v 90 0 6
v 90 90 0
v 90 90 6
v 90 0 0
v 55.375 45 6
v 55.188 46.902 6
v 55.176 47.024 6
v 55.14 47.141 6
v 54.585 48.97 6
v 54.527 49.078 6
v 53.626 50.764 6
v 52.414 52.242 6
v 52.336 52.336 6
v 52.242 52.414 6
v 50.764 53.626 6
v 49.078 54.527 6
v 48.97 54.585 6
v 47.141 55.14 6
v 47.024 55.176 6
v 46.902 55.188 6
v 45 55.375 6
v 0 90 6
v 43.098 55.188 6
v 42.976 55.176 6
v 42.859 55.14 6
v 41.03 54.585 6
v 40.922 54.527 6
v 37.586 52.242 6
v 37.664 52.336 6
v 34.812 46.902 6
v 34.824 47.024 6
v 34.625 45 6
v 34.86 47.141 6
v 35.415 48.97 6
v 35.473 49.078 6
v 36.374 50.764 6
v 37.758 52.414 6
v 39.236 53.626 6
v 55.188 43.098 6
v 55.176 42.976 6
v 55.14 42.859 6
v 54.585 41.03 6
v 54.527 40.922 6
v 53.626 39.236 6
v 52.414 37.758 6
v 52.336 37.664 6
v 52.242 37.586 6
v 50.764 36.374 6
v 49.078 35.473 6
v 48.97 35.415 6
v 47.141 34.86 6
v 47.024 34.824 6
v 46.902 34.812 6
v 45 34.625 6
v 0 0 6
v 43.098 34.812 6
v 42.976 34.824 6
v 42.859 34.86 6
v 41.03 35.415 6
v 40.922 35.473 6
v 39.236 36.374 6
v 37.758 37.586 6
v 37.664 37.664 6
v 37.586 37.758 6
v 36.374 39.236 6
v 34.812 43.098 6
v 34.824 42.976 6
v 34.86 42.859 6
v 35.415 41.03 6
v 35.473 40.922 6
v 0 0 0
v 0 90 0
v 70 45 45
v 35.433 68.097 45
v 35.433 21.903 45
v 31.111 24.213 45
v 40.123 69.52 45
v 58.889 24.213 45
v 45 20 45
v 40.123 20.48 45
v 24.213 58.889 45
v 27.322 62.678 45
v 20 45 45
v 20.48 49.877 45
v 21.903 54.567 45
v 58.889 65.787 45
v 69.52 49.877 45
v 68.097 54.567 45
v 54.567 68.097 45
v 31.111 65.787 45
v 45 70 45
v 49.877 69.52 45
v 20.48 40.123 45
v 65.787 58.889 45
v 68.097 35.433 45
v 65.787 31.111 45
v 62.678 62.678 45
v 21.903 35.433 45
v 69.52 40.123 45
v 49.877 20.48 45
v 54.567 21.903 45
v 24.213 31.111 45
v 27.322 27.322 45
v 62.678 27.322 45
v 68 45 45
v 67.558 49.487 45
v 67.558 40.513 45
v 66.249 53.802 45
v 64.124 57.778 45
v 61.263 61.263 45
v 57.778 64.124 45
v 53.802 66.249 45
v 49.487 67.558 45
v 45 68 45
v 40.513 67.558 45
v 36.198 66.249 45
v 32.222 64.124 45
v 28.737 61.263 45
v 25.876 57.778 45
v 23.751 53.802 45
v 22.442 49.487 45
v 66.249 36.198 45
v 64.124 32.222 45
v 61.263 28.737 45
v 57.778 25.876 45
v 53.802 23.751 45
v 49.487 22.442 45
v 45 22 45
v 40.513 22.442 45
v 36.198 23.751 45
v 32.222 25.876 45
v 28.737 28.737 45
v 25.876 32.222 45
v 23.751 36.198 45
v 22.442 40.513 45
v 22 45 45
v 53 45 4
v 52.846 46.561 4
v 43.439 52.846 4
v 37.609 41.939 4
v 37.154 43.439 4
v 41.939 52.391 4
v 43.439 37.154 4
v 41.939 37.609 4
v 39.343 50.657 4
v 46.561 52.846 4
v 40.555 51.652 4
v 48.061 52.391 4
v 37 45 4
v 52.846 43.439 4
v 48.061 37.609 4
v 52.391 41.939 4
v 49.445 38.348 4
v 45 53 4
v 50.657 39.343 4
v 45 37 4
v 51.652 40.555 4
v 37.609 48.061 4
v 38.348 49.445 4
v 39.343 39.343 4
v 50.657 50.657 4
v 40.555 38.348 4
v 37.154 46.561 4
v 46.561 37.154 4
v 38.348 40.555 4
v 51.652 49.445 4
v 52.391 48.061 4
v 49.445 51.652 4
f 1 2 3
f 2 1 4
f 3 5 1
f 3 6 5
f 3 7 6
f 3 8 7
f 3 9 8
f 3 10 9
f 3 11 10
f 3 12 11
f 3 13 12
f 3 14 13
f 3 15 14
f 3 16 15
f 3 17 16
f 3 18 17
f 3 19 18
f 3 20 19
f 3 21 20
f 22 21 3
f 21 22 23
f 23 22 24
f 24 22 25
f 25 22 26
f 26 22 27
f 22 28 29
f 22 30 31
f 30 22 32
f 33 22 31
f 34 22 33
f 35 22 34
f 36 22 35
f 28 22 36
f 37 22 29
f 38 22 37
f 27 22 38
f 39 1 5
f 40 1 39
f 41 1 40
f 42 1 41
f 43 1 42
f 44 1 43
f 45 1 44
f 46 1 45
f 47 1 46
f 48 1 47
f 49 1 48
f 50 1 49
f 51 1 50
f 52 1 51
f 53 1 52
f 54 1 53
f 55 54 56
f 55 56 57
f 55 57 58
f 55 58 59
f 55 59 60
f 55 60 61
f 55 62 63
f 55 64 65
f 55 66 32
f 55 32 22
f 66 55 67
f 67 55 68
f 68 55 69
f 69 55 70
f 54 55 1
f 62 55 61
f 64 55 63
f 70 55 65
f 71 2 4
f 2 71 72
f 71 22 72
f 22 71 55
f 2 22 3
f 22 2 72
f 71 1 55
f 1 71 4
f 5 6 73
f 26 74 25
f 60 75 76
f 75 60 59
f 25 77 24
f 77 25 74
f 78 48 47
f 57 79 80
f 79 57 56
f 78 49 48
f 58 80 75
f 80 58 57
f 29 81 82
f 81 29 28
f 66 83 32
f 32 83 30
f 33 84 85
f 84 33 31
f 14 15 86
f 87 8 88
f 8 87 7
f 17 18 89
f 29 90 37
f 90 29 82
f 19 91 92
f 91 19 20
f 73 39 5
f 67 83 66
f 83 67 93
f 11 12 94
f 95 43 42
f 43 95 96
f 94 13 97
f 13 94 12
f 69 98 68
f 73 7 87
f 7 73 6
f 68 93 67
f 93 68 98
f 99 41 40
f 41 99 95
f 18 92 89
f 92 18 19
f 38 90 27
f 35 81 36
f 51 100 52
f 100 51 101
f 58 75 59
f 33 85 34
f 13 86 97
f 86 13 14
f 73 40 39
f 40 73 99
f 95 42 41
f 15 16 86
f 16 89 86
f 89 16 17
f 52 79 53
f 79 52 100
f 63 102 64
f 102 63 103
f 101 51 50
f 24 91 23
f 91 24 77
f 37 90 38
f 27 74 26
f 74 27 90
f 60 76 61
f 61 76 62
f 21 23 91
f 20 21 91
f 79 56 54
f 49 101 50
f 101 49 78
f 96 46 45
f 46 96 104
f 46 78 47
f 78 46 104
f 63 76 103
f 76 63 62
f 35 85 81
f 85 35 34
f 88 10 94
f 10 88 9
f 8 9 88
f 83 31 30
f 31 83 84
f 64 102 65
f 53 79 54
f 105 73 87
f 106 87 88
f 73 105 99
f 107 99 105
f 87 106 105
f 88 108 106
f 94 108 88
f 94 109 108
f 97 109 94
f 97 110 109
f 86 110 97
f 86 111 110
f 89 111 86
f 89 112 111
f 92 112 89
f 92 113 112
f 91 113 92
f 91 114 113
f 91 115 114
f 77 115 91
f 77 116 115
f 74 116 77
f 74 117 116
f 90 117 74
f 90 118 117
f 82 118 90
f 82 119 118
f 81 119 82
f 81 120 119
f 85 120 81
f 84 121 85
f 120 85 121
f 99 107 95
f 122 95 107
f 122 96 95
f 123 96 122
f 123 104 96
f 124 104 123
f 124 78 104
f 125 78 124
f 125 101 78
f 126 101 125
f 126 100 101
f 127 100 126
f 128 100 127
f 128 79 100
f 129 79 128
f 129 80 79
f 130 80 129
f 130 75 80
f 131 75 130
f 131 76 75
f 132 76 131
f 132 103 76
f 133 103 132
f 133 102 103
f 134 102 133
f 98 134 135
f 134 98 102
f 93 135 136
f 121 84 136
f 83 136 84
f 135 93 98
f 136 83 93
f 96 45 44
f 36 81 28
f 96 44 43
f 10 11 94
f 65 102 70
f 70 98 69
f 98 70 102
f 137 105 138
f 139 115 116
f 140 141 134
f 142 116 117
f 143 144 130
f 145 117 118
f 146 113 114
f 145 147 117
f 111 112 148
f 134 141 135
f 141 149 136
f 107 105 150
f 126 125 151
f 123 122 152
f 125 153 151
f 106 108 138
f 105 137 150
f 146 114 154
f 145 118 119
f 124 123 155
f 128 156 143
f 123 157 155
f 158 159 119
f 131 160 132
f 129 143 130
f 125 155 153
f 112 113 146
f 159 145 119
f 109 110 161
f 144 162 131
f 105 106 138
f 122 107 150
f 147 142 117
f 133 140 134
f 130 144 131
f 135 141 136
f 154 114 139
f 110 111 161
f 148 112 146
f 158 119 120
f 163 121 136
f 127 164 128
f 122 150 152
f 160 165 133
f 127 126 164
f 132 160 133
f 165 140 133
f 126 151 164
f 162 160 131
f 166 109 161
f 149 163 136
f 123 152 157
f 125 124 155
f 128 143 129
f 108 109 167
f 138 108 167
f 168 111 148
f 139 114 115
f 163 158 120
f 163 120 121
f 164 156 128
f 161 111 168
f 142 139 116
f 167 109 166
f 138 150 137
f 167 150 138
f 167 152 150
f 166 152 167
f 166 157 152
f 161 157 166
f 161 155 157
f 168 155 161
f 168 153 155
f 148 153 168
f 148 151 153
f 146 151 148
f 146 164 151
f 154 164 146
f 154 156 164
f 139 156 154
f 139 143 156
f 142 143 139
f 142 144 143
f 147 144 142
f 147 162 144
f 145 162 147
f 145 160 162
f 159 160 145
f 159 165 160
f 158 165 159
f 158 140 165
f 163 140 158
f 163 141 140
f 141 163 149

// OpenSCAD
$fn = 32;

// ----------------------------------------------------------------------
// Hopper: funnel with square flange
// ----------------------------------------------------------------------

// --- parameters (mm) ---
fl = 90;                  // flange side, X and Y
fl_t = 6;                 // flange thickness
cone_h = 40;              // cone height above the flange
top_d = 50;               // cone mouth diameter
bot_d = 20;               // cone spout diameter
wall = 2;                 // cone wall thickness
fit_tol = 0.02;           // tolerance for press fits, mm
free_tol = 0.2;           // tolerance for clearance fits, mm

bore_d = bot_d - 2 * wall;  // spout bore diameter
total_h = fl_t + cone_h - 1;  // overall height

difference() {
  union() {
    cube([fl, fl, fl_t]);
    translate([fl / 2, fl / 2, fl_t - 1])
      cylinder(h = cone_h, d1 = bot_d, d2 = top_d);
  }
  translate([fl / 2, fl / 2, fl_t - 2])
    cylinder(h = cone_h + 1, d1 = bore_d, d2 = top_d - 2 * wall);
}
